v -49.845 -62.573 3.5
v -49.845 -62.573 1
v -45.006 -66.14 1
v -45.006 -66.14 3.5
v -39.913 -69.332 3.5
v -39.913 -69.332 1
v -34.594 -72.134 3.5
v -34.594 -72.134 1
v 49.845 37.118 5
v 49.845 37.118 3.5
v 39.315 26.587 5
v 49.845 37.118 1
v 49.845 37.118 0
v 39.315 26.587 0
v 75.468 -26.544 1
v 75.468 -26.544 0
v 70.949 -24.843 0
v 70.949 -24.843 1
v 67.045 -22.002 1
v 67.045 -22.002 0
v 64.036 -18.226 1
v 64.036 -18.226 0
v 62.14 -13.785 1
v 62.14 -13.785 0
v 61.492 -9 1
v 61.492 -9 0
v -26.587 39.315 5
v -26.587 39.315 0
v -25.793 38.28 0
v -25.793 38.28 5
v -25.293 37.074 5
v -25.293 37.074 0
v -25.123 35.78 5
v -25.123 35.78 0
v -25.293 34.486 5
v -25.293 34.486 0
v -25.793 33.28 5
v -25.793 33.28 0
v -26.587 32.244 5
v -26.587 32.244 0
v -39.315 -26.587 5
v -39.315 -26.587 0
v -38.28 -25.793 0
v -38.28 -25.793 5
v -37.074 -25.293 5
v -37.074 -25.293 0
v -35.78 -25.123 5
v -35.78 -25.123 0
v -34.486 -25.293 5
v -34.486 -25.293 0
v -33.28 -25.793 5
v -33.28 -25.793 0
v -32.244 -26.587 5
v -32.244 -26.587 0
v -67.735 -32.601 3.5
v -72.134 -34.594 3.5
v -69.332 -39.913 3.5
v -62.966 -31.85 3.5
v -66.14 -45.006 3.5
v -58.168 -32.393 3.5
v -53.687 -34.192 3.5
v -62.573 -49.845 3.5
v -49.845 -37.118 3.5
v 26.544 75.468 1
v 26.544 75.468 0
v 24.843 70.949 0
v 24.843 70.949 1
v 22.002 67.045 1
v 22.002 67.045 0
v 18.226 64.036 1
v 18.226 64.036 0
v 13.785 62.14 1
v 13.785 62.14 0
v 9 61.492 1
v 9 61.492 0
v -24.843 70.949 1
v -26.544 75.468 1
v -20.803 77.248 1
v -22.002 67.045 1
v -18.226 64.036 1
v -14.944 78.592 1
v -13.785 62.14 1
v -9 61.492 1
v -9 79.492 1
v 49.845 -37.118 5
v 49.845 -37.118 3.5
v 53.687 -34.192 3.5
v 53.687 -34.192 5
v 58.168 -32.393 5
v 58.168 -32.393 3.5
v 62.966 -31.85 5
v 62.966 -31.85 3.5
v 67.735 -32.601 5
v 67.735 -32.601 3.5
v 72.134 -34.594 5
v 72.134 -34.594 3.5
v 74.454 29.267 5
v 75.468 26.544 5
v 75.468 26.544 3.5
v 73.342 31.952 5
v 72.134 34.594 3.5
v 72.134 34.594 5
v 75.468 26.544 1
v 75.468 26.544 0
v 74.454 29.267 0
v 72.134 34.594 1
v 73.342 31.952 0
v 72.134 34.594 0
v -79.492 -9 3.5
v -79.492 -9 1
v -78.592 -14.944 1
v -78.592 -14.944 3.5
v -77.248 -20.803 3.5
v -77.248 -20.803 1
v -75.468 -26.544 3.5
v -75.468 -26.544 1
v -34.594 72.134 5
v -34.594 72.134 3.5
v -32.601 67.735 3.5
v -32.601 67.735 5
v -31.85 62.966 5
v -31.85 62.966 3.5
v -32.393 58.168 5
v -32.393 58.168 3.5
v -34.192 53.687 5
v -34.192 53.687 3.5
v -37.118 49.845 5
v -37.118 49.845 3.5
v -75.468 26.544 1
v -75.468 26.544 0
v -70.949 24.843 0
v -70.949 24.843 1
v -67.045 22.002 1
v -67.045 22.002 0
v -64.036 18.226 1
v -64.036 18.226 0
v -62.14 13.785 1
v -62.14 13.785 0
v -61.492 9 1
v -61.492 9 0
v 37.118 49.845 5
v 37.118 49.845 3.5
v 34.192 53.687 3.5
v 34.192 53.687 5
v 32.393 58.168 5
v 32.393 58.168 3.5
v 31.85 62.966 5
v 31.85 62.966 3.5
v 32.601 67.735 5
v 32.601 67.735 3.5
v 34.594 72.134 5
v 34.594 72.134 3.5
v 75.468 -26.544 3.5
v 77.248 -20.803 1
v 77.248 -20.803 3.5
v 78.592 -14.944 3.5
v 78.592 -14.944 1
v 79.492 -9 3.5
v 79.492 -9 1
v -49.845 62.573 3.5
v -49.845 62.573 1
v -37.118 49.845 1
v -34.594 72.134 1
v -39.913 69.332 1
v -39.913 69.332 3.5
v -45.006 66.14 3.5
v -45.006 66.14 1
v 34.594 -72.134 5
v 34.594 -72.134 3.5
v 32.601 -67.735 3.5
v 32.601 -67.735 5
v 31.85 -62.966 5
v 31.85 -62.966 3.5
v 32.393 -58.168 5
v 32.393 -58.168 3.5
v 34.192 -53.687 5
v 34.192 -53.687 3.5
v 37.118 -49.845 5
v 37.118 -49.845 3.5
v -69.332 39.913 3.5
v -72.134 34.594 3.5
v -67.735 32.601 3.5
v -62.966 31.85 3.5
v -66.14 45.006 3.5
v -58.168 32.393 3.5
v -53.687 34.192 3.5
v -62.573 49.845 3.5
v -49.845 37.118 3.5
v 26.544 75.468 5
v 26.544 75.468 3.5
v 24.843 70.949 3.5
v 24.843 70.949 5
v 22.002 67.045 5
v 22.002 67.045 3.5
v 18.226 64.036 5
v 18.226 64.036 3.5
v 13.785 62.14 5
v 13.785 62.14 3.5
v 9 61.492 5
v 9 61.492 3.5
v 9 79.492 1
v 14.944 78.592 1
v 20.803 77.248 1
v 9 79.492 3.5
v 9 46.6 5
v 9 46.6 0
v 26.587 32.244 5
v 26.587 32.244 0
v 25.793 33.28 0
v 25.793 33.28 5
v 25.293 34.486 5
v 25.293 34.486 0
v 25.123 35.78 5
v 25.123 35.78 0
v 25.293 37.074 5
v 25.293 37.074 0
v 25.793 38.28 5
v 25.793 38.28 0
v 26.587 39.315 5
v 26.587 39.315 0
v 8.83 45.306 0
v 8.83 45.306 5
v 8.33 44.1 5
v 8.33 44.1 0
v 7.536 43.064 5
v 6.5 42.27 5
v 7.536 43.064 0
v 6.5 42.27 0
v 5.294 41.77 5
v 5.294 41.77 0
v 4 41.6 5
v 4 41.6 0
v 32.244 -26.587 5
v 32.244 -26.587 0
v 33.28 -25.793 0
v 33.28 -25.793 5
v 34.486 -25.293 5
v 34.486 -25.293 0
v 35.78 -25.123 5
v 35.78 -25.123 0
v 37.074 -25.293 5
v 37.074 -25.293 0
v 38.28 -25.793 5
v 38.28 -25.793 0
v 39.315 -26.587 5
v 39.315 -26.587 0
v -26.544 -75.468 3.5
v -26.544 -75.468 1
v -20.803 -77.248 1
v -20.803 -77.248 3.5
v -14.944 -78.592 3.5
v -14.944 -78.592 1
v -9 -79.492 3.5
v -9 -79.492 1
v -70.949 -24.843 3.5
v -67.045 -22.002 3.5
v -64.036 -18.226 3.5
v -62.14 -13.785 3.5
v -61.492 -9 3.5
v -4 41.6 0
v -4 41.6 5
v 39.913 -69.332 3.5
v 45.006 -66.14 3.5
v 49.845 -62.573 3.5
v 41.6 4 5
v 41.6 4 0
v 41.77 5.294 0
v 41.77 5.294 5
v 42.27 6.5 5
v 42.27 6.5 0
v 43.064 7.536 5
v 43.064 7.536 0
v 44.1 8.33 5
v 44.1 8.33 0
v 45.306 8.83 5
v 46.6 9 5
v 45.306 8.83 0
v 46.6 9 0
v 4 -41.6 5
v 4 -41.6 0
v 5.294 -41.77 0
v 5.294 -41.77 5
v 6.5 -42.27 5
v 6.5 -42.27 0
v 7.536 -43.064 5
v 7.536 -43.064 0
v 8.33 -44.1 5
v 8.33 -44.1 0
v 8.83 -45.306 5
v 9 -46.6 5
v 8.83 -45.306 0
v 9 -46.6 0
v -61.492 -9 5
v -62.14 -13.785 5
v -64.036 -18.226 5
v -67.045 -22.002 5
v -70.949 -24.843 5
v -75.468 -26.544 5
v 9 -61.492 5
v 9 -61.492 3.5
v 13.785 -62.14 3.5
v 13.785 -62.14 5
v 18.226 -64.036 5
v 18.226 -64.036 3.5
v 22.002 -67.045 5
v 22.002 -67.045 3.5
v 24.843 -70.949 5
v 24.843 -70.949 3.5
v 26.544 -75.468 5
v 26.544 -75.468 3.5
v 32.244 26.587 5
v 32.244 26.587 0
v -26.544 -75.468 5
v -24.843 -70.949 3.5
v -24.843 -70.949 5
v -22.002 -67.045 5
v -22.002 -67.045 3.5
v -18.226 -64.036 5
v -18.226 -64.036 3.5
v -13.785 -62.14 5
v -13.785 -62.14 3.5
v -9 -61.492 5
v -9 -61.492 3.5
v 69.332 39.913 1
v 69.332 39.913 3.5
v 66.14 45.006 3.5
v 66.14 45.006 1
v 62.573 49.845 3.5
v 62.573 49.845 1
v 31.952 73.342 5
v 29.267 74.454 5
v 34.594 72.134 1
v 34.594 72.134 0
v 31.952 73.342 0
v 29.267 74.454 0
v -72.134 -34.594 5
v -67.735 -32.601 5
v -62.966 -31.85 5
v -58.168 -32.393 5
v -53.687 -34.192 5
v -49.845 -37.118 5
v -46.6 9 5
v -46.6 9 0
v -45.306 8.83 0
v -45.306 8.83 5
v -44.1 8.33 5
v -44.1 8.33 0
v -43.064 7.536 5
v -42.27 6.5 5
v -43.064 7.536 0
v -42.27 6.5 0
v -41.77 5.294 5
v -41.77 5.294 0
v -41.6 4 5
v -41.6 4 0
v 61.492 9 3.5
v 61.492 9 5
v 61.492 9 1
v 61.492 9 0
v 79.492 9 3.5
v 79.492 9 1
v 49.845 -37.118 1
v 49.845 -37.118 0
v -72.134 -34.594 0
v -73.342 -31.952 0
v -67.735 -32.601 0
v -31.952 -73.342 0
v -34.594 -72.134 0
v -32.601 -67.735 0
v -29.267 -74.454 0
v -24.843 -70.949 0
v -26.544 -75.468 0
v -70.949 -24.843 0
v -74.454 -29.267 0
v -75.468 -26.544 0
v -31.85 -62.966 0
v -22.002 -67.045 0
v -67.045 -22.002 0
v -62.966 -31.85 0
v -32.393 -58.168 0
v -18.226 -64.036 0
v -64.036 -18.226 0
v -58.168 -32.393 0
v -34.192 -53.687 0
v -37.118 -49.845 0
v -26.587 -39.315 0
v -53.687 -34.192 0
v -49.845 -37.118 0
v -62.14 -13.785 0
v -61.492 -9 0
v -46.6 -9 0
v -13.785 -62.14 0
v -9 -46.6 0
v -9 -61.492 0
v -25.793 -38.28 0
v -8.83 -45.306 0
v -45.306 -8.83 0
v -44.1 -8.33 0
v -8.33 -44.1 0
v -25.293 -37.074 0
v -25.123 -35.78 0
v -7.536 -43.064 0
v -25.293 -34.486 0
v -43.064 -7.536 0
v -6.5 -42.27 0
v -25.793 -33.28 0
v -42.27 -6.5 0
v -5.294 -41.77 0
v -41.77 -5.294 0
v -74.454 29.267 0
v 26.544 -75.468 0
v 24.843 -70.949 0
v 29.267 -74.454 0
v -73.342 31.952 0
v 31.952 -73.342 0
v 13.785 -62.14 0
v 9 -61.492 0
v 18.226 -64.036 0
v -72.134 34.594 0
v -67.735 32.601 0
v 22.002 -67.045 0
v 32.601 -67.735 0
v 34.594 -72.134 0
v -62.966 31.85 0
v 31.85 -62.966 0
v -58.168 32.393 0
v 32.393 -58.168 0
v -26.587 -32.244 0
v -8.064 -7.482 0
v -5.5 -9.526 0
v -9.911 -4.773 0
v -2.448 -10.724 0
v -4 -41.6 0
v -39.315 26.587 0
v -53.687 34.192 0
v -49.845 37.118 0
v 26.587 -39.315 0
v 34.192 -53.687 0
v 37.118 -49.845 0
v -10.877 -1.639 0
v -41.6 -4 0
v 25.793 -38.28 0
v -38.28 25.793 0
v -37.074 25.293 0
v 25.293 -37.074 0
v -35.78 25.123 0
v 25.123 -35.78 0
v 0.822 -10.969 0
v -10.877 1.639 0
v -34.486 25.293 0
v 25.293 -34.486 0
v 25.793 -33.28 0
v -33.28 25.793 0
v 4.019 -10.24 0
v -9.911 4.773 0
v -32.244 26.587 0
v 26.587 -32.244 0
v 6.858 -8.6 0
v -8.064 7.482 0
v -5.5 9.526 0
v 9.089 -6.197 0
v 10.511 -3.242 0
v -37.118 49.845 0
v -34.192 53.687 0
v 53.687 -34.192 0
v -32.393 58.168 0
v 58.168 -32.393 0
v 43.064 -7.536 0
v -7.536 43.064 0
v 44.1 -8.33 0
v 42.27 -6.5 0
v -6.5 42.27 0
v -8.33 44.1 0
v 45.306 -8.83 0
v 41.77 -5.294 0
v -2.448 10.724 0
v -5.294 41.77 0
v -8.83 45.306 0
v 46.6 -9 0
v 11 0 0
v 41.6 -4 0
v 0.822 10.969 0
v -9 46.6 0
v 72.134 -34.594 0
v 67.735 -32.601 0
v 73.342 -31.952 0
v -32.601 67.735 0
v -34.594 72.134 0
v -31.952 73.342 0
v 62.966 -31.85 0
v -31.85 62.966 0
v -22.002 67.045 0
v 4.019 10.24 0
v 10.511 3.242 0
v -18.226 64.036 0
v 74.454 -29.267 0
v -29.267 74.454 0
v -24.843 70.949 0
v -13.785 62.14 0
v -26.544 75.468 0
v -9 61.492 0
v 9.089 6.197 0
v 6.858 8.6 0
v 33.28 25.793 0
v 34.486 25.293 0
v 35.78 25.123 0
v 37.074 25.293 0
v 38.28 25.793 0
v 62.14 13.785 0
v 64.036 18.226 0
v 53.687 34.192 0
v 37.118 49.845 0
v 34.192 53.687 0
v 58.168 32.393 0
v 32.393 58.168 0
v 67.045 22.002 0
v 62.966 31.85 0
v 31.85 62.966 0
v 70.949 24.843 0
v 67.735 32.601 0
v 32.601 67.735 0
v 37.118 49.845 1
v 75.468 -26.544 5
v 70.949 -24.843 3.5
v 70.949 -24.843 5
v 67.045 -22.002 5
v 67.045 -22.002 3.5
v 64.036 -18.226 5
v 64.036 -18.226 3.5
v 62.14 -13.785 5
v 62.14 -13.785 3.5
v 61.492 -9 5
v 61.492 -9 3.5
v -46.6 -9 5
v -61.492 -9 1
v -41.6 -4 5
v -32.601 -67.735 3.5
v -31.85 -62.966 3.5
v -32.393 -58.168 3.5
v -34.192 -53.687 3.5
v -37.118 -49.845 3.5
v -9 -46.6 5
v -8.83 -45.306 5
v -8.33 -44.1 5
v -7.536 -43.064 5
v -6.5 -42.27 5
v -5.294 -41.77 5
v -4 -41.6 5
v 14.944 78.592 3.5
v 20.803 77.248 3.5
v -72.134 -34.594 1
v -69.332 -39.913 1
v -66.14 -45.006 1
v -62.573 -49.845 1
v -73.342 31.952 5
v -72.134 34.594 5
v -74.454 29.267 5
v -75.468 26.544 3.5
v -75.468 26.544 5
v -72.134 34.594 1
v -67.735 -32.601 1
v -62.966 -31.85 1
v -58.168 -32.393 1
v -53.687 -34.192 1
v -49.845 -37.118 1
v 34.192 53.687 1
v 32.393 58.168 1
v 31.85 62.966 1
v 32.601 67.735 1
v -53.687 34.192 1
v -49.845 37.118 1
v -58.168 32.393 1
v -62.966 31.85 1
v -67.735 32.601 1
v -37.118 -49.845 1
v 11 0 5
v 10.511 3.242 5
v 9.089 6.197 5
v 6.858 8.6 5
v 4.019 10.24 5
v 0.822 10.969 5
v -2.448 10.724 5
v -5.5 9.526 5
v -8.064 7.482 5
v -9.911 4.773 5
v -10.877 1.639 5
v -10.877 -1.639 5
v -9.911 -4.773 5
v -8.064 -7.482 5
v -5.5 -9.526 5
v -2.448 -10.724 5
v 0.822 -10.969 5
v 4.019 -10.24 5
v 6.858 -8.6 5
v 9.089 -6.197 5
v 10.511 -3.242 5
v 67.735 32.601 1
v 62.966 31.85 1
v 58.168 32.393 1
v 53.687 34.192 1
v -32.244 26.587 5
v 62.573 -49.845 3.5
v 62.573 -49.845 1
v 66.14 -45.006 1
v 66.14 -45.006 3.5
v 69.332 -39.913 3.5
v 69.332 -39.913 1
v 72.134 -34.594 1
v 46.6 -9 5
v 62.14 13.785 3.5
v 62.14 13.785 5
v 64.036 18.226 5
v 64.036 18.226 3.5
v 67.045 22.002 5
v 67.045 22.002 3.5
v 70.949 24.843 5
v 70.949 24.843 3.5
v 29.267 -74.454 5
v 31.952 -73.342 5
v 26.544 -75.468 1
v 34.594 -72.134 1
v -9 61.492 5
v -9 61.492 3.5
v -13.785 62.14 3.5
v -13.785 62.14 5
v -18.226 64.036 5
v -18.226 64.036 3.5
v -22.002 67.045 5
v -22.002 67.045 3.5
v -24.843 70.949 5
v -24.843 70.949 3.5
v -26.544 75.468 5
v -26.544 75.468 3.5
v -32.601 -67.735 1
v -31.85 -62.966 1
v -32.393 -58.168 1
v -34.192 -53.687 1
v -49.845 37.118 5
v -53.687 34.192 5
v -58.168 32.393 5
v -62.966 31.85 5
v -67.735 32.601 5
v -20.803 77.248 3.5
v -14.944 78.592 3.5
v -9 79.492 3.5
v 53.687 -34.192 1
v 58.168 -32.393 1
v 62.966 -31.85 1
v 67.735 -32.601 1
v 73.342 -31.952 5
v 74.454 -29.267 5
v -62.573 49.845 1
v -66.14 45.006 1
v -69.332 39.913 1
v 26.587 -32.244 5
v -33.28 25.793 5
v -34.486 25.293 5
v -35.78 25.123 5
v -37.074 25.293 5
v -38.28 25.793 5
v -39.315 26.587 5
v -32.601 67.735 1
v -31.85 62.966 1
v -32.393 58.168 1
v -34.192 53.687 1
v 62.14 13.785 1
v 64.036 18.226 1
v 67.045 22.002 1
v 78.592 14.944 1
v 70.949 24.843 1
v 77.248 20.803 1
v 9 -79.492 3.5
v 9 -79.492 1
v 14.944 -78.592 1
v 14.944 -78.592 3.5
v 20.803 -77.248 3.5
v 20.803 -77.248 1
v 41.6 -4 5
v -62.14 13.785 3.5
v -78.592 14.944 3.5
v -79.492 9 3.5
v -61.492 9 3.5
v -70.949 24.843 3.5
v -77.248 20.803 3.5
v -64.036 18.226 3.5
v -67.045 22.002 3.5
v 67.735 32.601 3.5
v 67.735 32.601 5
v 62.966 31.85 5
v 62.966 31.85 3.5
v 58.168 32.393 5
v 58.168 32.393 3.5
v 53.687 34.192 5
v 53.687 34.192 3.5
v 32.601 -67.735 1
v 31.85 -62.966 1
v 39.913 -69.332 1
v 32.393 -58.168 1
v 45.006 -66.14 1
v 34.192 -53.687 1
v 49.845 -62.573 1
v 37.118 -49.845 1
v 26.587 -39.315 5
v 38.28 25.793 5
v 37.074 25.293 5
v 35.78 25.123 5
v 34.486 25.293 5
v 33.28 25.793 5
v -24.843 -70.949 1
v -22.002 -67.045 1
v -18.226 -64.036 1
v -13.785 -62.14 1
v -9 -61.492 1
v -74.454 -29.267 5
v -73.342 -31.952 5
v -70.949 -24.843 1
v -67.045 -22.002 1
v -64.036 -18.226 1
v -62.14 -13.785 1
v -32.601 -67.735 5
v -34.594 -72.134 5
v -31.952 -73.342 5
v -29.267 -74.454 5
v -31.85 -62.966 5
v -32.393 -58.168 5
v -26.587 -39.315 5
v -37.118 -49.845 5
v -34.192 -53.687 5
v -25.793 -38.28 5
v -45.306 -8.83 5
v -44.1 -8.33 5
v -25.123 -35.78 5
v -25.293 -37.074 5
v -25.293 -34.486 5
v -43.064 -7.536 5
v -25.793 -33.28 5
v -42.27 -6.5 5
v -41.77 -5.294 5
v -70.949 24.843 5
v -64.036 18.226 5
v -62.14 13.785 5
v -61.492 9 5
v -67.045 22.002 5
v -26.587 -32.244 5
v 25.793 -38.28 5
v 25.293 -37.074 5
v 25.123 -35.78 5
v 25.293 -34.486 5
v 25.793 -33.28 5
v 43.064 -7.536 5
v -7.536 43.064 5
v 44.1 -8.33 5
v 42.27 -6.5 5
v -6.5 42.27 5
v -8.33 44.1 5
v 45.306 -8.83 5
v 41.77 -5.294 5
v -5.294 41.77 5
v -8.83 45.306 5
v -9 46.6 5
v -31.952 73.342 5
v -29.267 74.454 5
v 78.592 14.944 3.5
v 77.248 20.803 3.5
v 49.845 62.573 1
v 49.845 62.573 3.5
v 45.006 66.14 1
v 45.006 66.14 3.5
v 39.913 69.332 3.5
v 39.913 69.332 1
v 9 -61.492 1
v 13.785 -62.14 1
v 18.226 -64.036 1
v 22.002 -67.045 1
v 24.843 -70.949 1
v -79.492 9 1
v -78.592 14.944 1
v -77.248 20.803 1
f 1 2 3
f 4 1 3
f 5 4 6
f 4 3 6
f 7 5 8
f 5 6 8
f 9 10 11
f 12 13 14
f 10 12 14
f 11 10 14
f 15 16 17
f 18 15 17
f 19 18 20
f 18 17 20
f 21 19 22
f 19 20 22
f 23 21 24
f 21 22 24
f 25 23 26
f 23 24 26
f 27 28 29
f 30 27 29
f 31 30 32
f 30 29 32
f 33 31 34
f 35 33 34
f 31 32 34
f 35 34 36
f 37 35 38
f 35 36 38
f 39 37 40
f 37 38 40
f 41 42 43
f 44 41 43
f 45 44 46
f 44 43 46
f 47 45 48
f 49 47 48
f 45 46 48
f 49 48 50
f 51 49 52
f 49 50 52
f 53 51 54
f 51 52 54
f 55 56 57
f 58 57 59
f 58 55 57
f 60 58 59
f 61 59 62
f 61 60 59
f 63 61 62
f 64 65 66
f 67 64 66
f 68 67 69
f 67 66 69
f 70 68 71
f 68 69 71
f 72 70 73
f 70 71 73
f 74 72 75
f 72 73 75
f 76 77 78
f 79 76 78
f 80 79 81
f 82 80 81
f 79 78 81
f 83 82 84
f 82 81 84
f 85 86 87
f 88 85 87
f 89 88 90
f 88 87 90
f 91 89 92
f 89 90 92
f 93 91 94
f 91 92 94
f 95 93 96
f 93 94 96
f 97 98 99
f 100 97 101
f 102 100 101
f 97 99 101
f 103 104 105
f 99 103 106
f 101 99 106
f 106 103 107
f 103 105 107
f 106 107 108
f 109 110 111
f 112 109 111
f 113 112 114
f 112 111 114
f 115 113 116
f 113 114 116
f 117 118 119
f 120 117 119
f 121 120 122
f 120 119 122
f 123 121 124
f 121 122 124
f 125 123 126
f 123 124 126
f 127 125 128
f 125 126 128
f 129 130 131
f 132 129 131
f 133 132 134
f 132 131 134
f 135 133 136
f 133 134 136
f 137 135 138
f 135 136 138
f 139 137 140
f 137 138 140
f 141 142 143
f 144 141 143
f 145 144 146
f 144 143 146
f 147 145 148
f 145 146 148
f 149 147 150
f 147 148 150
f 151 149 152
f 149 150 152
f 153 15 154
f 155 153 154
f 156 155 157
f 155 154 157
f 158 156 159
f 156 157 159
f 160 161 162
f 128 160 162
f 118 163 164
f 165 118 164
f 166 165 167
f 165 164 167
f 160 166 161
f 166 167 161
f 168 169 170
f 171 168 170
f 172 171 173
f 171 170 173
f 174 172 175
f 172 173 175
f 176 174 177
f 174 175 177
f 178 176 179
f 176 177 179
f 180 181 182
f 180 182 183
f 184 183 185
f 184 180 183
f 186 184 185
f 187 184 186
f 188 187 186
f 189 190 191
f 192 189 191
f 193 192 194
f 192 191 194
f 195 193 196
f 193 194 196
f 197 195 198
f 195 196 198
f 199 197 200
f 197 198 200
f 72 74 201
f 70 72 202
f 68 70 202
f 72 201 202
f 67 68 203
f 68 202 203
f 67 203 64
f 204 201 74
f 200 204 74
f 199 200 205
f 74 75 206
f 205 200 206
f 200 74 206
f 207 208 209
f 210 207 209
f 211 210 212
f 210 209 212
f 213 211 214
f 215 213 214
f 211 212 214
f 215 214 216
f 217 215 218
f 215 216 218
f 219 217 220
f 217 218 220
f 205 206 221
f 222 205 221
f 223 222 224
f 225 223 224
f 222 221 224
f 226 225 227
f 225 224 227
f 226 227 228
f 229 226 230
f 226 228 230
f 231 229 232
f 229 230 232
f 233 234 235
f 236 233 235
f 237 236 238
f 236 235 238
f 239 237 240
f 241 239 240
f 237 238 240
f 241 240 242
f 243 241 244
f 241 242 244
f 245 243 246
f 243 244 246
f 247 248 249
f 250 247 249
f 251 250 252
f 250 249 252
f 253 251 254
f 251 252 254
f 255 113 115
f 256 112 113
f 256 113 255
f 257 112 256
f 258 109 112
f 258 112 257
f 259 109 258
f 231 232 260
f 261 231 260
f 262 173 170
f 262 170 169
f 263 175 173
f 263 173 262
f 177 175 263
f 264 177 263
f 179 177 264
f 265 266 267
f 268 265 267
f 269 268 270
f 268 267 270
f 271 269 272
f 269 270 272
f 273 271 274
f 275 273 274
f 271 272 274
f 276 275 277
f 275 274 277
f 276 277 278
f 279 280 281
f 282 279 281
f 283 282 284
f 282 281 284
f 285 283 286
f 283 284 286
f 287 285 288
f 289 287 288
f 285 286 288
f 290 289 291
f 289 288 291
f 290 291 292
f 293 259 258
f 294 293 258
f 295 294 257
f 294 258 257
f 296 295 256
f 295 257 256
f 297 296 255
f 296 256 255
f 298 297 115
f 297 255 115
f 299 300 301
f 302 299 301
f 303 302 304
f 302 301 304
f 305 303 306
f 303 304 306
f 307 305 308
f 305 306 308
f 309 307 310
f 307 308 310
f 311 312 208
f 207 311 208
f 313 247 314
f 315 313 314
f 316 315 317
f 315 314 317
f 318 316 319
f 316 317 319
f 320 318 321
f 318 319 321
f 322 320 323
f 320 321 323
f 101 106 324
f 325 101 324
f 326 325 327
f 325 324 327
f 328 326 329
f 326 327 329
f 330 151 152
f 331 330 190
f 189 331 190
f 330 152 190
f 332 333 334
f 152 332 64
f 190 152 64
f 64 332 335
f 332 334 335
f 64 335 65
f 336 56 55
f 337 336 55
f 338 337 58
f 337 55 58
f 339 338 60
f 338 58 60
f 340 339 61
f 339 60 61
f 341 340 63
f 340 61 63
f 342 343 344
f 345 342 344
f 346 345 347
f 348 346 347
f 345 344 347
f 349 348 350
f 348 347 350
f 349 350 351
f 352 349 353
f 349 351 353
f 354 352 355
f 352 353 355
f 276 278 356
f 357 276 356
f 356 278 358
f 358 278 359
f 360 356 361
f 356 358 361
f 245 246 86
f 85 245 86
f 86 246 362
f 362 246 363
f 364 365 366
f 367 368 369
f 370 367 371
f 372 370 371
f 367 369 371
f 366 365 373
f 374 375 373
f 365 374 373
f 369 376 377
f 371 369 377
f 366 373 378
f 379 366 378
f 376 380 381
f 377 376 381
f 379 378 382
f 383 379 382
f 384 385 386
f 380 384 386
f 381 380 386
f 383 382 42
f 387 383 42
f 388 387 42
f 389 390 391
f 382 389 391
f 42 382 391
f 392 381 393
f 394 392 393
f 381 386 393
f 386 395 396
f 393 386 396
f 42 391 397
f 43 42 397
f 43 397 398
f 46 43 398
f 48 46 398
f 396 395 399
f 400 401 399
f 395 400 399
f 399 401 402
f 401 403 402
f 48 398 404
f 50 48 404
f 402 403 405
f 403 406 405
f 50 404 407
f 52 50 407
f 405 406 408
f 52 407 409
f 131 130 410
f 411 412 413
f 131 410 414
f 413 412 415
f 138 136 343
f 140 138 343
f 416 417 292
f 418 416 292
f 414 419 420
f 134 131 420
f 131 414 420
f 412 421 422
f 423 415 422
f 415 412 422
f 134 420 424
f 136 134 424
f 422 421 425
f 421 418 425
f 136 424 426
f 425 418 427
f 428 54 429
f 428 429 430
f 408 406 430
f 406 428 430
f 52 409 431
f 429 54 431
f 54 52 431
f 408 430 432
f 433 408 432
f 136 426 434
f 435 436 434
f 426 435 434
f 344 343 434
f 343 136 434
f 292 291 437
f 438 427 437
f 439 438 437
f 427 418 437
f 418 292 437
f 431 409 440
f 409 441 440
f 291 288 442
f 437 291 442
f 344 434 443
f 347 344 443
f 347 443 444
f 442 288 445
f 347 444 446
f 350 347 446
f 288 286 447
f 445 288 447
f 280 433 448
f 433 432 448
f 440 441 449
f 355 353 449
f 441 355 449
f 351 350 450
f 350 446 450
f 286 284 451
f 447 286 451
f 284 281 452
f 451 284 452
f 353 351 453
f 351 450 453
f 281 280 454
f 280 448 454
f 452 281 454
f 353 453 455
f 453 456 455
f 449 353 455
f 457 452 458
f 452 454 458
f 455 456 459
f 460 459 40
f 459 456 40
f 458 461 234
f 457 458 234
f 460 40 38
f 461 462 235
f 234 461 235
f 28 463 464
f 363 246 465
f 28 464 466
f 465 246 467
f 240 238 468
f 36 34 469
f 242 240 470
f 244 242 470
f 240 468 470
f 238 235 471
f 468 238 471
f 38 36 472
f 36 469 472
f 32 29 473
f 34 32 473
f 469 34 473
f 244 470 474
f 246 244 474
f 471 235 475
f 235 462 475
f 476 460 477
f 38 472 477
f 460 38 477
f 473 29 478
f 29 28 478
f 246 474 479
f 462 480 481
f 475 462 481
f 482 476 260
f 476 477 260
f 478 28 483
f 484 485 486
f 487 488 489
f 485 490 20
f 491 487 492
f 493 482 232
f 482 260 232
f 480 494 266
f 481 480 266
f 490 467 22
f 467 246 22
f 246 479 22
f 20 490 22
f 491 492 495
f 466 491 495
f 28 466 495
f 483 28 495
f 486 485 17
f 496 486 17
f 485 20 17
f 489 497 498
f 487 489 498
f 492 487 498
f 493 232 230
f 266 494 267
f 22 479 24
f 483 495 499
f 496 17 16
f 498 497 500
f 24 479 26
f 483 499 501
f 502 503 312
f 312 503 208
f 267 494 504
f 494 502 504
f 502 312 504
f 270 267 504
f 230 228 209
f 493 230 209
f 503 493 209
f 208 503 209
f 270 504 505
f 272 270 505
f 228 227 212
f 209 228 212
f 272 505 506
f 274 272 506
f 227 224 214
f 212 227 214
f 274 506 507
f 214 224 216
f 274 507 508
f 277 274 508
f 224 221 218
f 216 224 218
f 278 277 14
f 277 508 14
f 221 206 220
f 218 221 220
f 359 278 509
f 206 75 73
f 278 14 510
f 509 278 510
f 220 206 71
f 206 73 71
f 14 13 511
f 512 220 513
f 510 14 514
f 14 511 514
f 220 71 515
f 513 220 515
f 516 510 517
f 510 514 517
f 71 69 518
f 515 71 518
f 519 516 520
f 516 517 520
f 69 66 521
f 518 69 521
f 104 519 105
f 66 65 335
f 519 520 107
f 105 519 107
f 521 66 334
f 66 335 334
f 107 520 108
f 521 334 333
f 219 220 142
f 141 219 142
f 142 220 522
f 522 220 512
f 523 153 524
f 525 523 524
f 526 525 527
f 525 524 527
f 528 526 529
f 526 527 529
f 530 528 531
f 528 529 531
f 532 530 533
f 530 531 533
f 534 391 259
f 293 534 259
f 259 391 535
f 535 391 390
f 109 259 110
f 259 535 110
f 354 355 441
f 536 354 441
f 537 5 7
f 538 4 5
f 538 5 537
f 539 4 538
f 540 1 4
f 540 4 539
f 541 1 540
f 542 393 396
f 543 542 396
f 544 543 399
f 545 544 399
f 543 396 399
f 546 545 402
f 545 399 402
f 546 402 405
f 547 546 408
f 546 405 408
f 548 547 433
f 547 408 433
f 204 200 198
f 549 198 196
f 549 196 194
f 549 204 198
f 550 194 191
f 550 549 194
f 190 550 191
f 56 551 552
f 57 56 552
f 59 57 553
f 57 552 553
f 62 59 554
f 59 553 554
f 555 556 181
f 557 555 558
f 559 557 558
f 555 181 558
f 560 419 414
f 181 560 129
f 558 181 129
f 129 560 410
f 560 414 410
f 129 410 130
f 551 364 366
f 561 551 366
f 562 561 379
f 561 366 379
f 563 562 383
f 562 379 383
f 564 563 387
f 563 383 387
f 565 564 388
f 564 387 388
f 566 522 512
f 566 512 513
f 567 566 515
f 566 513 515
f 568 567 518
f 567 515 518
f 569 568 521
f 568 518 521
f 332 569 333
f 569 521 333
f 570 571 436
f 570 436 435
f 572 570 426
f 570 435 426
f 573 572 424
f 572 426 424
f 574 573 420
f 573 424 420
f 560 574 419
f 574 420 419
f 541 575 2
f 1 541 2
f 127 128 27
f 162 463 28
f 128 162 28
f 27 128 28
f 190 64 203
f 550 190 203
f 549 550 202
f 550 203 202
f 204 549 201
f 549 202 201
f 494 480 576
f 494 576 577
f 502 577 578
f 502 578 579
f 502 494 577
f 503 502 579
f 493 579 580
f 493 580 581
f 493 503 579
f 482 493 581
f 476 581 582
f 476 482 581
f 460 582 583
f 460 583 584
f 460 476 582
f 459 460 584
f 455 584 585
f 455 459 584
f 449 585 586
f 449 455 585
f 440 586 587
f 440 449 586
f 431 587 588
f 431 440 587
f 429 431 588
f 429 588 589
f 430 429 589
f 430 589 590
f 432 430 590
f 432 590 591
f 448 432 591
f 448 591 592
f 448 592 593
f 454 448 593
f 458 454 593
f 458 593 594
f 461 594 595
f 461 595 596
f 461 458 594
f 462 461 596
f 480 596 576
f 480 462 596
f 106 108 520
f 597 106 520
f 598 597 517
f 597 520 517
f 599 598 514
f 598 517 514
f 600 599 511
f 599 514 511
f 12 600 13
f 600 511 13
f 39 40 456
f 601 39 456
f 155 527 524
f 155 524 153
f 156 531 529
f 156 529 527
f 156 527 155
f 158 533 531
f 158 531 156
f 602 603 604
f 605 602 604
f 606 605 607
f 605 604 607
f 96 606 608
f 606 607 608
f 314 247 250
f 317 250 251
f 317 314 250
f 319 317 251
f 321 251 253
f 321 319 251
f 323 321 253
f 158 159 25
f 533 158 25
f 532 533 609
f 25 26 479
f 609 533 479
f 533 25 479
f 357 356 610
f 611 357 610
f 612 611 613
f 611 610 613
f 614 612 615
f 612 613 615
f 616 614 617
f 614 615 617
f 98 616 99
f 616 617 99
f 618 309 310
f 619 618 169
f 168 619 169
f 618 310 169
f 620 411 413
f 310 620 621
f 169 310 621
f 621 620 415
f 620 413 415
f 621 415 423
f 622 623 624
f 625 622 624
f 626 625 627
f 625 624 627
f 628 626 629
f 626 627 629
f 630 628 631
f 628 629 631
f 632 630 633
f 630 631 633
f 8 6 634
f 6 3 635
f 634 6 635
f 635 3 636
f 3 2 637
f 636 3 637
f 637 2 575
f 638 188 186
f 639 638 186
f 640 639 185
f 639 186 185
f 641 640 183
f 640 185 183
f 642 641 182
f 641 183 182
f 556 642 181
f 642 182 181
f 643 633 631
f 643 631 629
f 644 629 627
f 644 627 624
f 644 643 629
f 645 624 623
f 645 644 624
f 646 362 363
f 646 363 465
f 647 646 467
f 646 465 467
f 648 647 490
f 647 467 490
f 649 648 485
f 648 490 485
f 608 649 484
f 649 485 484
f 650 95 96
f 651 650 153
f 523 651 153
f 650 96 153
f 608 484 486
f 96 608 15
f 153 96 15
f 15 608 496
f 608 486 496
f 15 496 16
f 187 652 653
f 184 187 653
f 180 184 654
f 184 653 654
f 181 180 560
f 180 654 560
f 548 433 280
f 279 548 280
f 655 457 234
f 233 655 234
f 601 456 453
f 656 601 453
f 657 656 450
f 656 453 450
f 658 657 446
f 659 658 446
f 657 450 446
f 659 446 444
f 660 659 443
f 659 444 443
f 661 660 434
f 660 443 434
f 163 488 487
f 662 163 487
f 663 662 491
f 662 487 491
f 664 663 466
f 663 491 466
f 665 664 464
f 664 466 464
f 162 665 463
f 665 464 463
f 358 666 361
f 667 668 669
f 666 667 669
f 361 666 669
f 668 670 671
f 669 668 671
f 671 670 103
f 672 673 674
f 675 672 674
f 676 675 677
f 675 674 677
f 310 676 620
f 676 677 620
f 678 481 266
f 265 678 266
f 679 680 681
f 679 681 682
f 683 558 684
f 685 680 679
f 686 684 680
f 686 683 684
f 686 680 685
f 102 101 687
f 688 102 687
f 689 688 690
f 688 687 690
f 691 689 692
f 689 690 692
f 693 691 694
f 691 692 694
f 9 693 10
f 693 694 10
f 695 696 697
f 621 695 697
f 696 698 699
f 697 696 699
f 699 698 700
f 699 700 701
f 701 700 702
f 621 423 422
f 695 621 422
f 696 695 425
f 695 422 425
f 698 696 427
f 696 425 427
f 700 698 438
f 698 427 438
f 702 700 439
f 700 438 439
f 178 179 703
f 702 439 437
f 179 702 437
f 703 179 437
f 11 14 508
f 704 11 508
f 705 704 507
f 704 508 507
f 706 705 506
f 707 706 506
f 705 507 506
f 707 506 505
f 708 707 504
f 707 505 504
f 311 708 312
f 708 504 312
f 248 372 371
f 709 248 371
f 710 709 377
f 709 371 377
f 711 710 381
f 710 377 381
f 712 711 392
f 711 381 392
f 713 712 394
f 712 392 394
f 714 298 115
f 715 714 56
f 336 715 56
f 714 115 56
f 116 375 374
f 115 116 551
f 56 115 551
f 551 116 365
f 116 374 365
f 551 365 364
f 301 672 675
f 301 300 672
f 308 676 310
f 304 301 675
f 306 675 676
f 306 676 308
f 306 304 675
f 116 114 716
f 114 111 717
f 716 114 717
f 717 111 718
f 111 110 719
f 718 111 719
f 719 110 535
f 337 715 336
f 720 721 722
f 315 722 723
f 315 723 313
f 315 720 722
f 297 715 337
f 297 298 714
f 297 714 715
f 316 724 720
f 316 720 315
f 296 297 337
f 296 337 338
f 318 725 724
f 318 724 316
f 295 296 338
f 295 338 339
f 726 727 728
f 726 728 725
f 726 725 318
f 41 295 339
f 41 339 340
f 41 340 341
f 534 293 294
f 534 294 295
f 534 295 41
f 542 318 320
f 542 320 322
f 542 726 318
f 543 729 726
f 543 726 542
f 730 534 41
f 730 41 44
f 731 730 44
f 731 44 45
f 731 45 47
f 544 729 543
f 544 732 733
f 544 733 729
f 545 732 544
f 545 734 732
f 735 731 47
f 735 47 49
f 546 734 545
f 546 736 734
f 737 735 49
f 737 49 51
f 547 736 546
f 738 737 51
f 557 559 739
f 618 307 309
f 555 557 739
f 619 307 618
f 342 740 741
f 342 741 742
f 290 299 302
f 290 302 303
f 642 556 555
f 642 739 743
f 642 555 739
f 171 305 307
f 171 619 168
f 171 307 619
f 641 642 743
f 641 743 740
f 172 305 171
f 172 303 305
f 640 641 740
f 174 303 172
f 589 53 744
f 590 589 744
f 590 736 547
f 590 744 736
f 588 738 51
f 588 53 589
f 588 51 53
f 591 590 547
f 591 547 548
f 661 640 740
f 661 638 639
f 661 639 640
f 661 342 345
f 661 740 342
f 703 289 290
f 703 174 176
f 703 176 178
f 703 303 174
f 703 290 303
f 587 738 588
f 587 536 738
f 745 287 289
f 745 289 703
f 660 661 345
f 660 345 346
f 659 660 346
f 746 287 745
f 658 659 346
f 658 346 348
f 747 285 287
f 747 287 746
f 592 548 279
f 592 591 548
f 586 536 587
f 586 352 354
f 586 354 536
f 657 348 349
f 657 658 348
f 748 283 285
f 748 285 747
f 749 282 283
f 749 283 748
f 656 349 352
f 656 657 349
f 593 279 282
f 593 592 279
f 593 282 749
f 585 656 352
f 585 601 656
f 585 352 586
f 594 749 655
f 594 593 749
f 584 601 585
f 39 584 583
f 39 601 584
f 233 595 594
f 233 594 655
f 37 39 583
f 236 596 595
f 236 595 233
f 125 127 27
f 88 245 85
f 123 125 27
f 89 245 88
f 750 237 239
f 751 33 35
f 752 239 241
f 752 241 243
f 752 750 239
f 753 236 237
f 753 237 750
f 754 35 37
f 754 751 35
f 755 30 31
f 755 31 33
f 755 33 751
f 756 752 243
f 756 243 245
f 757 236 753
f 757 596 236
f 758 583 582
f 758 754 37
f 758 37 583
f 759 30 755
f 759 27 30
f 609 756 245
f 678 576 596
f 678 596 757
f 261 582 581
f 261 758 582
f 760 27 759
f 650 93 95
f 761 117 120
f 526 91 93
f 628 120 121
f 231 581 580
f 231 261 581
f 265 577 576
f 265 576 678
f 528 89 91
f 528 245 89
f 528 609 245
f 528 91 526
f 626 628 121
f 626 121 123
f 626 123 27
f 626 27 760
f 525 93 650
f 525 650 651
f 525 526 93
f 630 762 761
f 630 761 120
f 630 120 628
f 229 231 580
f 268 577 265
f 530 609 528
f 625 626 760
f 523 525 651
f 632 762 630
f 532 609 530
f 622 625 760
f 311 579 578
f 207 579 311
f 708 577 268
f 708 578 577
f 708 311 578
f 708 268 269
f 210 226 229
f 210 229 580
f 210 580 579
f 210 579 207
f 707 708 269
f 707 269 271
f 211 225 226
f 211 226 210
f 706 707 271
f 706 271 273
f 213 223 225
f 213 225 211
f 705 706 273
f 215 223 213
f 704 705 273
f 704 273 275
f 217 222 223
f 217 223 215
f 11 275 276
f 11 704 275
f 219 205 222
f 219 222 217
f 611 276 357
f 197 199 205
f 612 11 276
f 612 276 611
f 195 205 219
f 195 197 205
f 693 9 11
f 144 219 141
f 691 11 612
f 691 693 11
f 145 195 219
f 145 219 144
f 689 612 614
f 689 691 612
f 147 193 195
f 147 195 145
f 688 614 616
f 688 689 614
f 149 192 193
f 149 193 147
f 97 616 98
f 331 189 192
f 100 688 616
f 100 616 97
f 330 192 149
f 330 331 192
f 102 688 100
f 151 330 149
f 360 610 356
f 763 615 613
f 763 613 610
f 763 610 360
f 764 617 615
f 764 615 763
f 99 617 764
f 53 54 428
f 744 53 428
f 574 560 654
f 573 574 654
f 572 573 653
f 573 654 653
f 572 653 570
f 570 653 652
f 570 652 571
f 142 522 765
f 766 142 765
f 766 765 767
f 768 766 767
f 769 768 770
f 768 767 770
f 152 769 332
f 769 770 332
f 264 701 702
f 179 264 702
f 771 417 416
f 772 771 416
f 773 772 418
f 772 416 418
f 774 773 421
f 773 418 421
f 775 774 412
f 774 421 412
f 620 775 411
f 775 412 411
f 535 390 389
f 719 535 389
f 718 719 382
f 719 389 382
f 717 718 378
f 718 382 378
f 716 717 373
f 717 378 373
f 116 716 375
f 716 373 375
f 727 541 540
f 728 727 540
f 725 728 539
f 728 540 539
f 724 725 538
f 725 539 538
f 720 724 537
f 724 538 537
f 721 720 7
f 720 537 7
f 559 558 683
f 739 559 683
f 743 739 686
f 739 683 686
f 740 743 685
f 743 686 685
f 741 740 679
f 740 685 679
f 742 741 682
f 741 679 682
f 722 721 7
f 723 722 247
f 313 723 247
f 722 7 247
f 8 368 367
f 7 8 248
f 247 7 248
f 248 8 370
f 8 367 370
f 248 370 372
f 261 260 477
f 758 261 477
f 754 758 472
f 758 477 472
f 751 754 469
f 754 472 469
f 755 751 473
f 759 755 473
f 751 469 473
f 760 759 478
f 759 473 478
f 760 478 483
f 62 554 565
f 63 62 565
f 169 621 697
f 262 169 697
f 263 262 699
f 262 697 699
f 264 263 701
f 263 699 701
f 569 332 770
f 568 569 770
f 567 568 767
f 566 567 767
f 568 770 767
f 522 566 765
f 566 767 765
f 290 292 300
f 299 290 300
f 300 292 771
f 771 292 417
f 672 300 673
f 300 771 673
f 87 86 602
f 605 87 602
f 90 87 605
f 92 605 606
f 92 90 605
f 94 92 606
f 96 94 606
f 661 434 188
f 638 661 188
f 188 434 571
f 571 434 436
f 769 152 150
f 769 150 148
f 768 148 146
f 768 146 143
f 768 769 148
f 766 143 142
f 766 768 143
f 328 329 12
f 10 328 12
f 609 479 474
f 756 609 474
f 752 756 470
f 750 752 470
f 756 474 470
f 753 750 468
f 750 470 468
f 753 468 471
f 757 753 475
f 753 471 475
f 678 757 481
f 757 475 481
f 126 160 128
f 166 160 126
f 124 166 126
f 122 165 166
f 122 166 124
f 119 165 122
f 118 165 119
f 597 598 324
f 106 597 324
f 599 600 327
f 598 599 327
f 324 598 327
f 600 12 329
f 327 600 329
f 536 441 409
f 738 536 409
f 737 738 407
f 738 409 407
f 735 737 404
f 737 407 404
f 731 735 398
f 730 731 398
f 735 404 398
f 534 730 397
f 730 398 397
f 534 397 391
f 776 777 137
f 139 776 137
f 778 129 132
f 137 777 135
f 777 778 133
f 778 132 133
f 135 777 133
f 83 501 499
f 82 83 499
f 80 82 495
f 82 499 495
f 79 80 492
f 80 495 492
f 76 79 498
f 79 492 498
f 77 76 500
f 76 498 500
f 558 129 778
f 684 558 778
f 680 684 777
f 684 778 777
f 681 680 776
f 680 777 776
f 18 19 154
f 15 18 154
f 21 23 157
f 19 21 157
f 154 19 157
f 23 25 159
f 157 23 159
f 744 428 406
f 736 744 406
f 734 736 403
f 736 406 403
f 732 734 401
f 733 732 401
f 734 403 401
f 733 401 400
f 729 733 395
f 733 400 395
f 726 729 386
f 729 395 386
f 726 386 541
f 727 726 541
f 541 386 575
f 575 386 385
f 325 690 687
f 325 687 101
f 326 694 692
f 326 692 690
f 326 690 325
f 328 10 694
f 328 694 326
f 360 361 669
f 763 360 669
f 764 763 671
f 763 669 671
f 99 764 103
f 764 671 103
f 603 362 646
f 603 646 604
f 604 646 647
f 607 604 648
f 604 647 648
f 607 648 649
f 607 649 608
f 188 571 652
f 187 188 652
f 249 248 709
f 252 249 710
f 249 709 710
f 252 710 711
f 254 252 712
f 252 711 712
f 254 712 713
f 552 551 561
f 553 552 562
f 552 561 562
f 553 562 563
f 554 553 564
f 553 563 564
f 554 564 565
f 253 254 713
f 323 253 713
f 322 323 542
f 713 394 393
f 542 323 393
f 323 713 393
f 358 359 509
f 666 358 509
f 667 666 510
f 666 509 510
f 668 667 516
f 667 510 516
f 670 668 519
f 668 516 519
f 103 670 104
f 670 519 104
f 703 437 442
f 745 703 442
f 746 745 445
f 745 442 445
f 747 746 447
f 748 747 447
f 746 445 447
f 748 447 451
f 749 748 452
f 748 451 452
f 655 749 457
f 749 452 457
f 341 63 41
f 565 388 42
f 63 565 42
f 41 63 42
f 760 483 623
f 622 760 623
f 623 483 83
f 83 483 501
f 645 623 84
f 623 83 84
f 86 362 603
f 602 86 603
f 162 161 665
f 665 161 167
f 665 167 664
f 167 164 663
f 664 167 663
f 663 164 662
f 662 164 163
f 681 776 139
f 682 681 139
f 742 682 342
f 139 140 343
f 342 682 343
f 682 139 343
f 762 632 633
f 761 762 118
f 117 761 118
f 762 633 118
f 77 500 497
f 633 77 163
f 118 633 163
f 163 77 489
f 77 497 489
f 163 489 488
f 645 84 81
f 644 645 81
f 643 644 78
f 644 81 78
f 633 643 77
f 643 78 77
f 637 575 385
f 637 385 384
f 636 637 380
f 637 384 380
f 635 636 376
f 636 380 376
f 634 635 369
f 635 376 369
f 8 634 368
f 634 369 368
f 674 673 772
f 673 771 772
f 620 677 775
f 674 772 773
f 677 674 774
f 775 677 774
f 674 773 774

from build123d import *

# Parameters (mm, degrees)
SKETCH1_R           = 11
BOSS_EXTRUDE1_DEPTH = 5
BOSS_EXTRUDE2_START = -4
BOSS_EXTRUDE2_DEPTH = 2.5


with BuildPart() as part:
    # Sketch1 → Boss-Extrude1 (new body)
    with BuildSketch(Plane.XY):
        with BuildLine():
            ThreePointArc((4, -41.6), (7.535533906, -43.064466094), (9, -46.6))
            Line((9, -46.6), (9, -61.492137976))
            ThreePointArc((9, -61.492137976), (20.215230476, -65.413125036), (26.544375, -75.467848491))
            ThreePointArc((26.544375, -75.467848491), (30.614674589, -73.910362601), (34.594119865, -72.133534994))
            ThreePointArc((34.594119865, -72.133534994), (31.959737739, -60.548390845), (37.117546722, -49.845468783))
            Line((37.117546722, -49.845468783), (26.587214973, -39.315137034))
            ThreePointArc((26.587214973, -39.315137034), (25.122748879, -35.779603128), (26.587214973, -32.244069222))
            Line((26.587214973, -32.244069222), (32.244069222, -26.587214973))
            ThreePointArc((32.244069222, -26.587214973), (35.779603128, -25.122748879), (39.315137034, -26.587214973))
            Line((39.315137034, -26.587214973), (49.845468783, -37.117546722))
            ThreePointArc((49.845468783, -37.117546722), (60.548390845, -31.959737739), (72.133534994, -34.594119865))
            ThreePointArc((72.133534994, -34.594119865), (73.910362601, -30.614674589), (75.467848491, -26.544375))
            ThreePointArc((75.467848491, -26.544375), (65.413125036, -20.215230476), (61.492137976, -9))
            Line((61.492137976, -9), (46.6, -9))
            ThreePointArc((46.6, -9), (43.064466094, -7.535533906), (41.6, -4))
            Line((41.6, -4), (41.6, 4))
            ThreePointArc((41.6, 4), (43.064466094, 7.535533906), (46.6, 9))
            Line((46.6, 9), (61.492137976, 9))
            ThreePointArc((61.492137976, 9), (65.413125036, 20.215230476), (75.467848491, 26.544375))
            ThreePointArc((75.467848491, 26.544375), (73.910362601, 30.614674589), (72.133534994, 34.594119865))
            ThreePointArc((72.133534994, 34.594119865), (60.548390845, 31.959737739), (49.845468783, 37.117546722))
            Line((49.845468783, 37.117546722), (39.315137034, 26.587214973))
            ThreePointArc((39.315137034, 26.587214973), (35.779603128, 25.122748879), (32.244069222, 26.587214973))
            Line((32.244069222, 26.587214973), (26.587214973, 32.244069222))
            ThreePointArc((26.587214973, 32.244069222), (25.122748879, 35.779603128), (26.587214973, 39.315137034))
            Line((26.587214973, 39.315137034), (37.117546722, 49.845468783))
            ThreePointArc((37.117546722, 49.845468783), (31.959737739, 60.548390845), (34.594119865, 72.133534994))
            ThreePointArc((34.594119865, 72.133534994), (30.614674589, 73.910362601), (26.544375, 75.467848491))
            ThreePointArc((26.544375, 75.467848491), (20.215230476, 65.413125036), (9, 61.492137976))
            Line((9, 61.492137976), (9, 46.6))
            ThreePointArc((9, 46.6), (7.535533906, 43.064466094), (4, 41.6))
            Line((4, 41.6), (-4, 41.6))
            ThreePointArc((-4, 41.6), (-7.535533906, 43.064466094), (-9, 46.6))
            Line((-9, 46.6), (-9, 61.492137976))
            ThreePointArc((-9, 61.492137976), (-20.215230476, 65.413125036), (-26.544375, 75.467848491))
            ThreePointArc((-26.544375, 75.467848491), (-30.614674589, 73.910362601), (-34.594119865, 72.133534994))
            ThreePointArc((-34.594119865, 72.133534994), (-31.959737739, 60.548390845), (-37.117546722, 49.845468783))
            Line((-37.117546722, 49.845468783), (-26.587214973, 39.315137034))
            ThreePointArc((-26.587214973, 39.315137034), (-25.122748879, 35.779603128), (-26.587214973, 32.244069222))
            Line((-26.587214973, 32.244069222), (-32.244069222, 26.587214973))
            ThreePointArc((-32.244069222, 26.587214973), (-35.779603128, 25.122748879), (-39.315137034, 26.587214973))
            Line((-39.315137034, 26.587214973), (-49.845468783, 37.117546722))
            ThreePointArc((-49.845468783, 37.117546722), (-60.548390845, 31.959737739), (-72.133534994, 34.594119865))
            ThreePointArc((-72.133534994, 34.594119865), (-73.910362601, 30.614674589), (-75.467848491, 26.544375))
            ThreePointArc((-75.467848491, 26.544375), (-65.413125036, 20.215230476), (-61.492137976, 9))
            Line((-61.492137976, 9), (-46.6, 9))
            ThreePointArc((-46.6, 9), (-43.064466094, 7.535533906), (-41.6, 4))
            Line((-41.6, 4), (-41.6, -4))
            ThreePointArc((-41.6, -4), (-43.064466094, -7.535533906), (-46.6, -9))
            Line((-46.6, -9), (-61.492137976, -9))
            ThreePointArc((-61.492137976, -9), (-65.413125036, -20.215230476), (-75.467848491, -26.544375))
            ThreePointArc((-75.467848491, -26.544375), (-73.910362601, -30.614674589), (-72.133534994, -34.594119865))
            ThreePointArc((-72.133534994, -34.594119865), (-60.548390845, -31.959737739), (-49.845468783, -37.117546722))
            Line((-49.845468783, -37.117546722), (-39.315137034, -26.587214973))
            ThreePointArc((-39.315137034, -26.587214973), (-35.779603128, -25.122748879), (-32.244069222, -26.587214973))
            Line((-32.244069222, -26.587214973), (-26.587214973, -32.244069222))
            ThreePointArc((-26.587214973, -32.244069222), (-25.122748879, -35.779603128), (-26.587214973, -39.315137034))
            Line((-26.587214973, -39.315137034), (-37.117546722, -49.845468783))
            ThreePointArc((-37.117546722, -49.845468783), (-31.959737739, -60.548390845), (-34.594119865, -72.133534994))
            ThreePointArc((-34.594119865, -72.133534994), (-30.614674589, -73.910362601), (-26.544375, -75.467848491))
            ThreePointArc((-26.544375, -75.467848491), (-20.215230476, -65.413125036), (-9, -61.492137976))
            Line((-9, -61.492137976), (-9, -46.6))
            ThreePointArc((-9, -46.6), (-7.535533906, -43.064466094), (-4, -41.6))
            Line((-4, -41.6), (4, -41.6))
        make_face()
        Circle(SKETCH1_R, mode=Mode.SUBTRACT)
    extrude(amount=BOSS_EXTRUDE1_DEPTH)

    # Sketch2 → Boss-Extrude2 (add)
    with BuildSketch(Plane.XY.offset(5).offset(BOSS_EXTRUDE2_START)):
        with BuildLine():
            ThreePointArc((-37.117546722, 49.845468783), (-31.959737739, 60.548390845), (-34.594119865, 72.133534994))
            ThreePointArc((-34.594119865, 72.133534994), (-42.489529555, 67.783772971), (-49.845468783, 62.573390845))
            Line((-49.845468783, 62.573390845), (-37.117546722, 49.845468783))
        make_face()
        with BuildLine():
            Line((-49.845468783, 37.117546722), (-62.573390845, 49.845468783))
            ThreePointArc((-62.573390845, 49.845468783), (-67.783772971, 42.489529555), (-72.133534994, 34.594119865))
            ThreePointArc((-72.133534994, 34.594119865), (-60.548390845, 31.959737739), (-49.845468783, 37.117546722))
        make_face()
        with BuildLine():
            Line((-9, 61.492137976), (-9, 79.492137976))
            ThreePointArc((-9, 79.492137976), (-17.885731045, 77.975), (-26.544375, 75.467848491))
            ThreePointArc((-26.544375, 75.467848491), (-20.215230476, 65.413125036), (-9, 61.492137976))
        make_face()
        with BuildLine():
            ThreePointArc((9, 61.492137976), (20.215230476, 65.413125036), (26.544375, 75.467848491))
            ThreePointArc((26.544375, 75.467848491), (17.885731045, 77.975), (9, 79.492137976))
            Line((9, 79.492137976), (9, 61.492137976))
        make_face()
        with BuildLine():
            Line((37.117546722, 49.845468783), (49.845468783, 62.573390845))
            ThreePointArc((49.845468783, 62.573390845), (42.489529555, 67.783772971), (34.594119865, 72.133534994))
            ThreePointArc((34.594119865, 72.133534994), (31.959737739, 60.548390845), (37.117546722, 49.845468783))
        make_face()
        with BuildLine():
            ThreePointArc((49.845468783, 37.117546722), (60.548390845, 31.959737739), (72.133534994, 34.594119865))
            ThreePointArc((72.133534994, 34.594119865), (67.783772971, 42.489529555), (62.573390845, 49.845468783))
            Line((62.573390845, 49.845468783), (49.845468783, 37.117546722))
        make_face()
        with BuildLine():
            Line((61.492137976, 9), (79.492137976, 9))
            ThreePointArc((79.492137976, 9), (77.975, 17.885731045), (75.467848491, 26.544375))
            ThreePointArc((75.467848491, 26.544375), (65.413125036, 20.215230476), (61.492137976, 9))
        make_face()
        with BuildLine():
            Line((79.492137976, -9), (61.492137976, -9))
            ThreePointArc((61.492137976, -9), (65.413125036, -20.215230476), (75.467848491, -26.544375))
            ThreePointArc((75.467848491, -26.544375), (77.975, -17.885731045), (79.492137976, -9))
        make_face()
        with BuildLine():
            ThreePointArc((62.573390845, -49.845468783), (67.783772971, -42.489529555), (72.133534994, -34.594119865))
            ThreePointArc((72.133534994, -34.594119865), (60.548390845, -31.959737739), (49.845468783, -37.117546722))
            Line((49.845468783, -37.117546722), (62.573390845, -49.845468783))
        make_face()
        with BuildLine():
            ThreePointArc((34.594119865, -72.133534994), (42.489529555, -67.783772971), (49.845468783, -62.573390845))
            Line((49.845468783, -62.573390845), (37.117546722, -49.845468783))
            ThreePointArc((37.117546722, -49.845468783), (31.959737739, -60.548390845), (34.594119865, -72.133534994))
        make_face()
        with BuildLine():
            ThreePointArc((9, -79.492137976), (17.885731045, -77.975), (26.544375, -75.467848491))
            ThreePointArc((26.544375, -75.467848491), (20.215230476, -65.413125036), (9, -61.492137976))
            Line((9, -61.492137976), (9, -79.492137976))
        make_face()
        with BuildLine():
            ThreePointArc((-26.544375, -75.467848491), (-17.885731045, -77.975), (-9, -79.492137976))
            Line((-9, -79.492137976), (-9, -61.492137976))
            ThreePointArc((-9, -61.492137976), (-20.215230476, -65.413125036), (-26.544375, -75.467848491))
        make_face()
        with BuildLine():
            ThreePointArc((-49.845468783, -62.573390845), (-42.489529555, -67.783772971), (-34.594119865, -72.133534994))
            ThreePointArc((-34.594119865, -72.133534994), (-31.959737739, -60.548390845), (-37.117546722, -49.845468783))
            Line((-37.117546722, -49.845468783), (-49.845468783, -62.573390845))
        make_face()
        with BuildLine():
            ThreePointArc((-72.133534994, -34.594119865), (-67.783772971, -42.489529555), (-62.573390845, -49.845468783))
            Line((-62.573390845, -49.845468783), (-49.845468783, -37.117546722))
            ThreePointArc((-49.845468783, -37.117546722), (-60.548390845, -31.959737739), (-72.133534994, -34.594119865))
        make_face()
        with BuildLine():
            ThreePointArc((-79.492137976, -9), (-77.975, -17.885731045), (-75.467848491, -26.544375))
            ThreePointArc((-75.467848491, -26.544375), (-65.413125036, -20.215230476), (-61.492137976, -9))
            Line((-61.492137976, -9), (-79.492137976, -9))
        make_face()
        with BuildLine():
            ThreePointArc((-75.467848491, 26.544375), (-77.975, 17.885731045), (-79.492137976, 9))
            Line((-79.492137976, 9), (-61.492137976, 9))
            ThreePointArc((-61.492137976, 9), (-65.413125036, 20.215230476), (-75.467848491, 26.544375))
        make_face()
    extrude(amount=BOSS_EXTRUDE2_DEPTH)


solid = part.part
